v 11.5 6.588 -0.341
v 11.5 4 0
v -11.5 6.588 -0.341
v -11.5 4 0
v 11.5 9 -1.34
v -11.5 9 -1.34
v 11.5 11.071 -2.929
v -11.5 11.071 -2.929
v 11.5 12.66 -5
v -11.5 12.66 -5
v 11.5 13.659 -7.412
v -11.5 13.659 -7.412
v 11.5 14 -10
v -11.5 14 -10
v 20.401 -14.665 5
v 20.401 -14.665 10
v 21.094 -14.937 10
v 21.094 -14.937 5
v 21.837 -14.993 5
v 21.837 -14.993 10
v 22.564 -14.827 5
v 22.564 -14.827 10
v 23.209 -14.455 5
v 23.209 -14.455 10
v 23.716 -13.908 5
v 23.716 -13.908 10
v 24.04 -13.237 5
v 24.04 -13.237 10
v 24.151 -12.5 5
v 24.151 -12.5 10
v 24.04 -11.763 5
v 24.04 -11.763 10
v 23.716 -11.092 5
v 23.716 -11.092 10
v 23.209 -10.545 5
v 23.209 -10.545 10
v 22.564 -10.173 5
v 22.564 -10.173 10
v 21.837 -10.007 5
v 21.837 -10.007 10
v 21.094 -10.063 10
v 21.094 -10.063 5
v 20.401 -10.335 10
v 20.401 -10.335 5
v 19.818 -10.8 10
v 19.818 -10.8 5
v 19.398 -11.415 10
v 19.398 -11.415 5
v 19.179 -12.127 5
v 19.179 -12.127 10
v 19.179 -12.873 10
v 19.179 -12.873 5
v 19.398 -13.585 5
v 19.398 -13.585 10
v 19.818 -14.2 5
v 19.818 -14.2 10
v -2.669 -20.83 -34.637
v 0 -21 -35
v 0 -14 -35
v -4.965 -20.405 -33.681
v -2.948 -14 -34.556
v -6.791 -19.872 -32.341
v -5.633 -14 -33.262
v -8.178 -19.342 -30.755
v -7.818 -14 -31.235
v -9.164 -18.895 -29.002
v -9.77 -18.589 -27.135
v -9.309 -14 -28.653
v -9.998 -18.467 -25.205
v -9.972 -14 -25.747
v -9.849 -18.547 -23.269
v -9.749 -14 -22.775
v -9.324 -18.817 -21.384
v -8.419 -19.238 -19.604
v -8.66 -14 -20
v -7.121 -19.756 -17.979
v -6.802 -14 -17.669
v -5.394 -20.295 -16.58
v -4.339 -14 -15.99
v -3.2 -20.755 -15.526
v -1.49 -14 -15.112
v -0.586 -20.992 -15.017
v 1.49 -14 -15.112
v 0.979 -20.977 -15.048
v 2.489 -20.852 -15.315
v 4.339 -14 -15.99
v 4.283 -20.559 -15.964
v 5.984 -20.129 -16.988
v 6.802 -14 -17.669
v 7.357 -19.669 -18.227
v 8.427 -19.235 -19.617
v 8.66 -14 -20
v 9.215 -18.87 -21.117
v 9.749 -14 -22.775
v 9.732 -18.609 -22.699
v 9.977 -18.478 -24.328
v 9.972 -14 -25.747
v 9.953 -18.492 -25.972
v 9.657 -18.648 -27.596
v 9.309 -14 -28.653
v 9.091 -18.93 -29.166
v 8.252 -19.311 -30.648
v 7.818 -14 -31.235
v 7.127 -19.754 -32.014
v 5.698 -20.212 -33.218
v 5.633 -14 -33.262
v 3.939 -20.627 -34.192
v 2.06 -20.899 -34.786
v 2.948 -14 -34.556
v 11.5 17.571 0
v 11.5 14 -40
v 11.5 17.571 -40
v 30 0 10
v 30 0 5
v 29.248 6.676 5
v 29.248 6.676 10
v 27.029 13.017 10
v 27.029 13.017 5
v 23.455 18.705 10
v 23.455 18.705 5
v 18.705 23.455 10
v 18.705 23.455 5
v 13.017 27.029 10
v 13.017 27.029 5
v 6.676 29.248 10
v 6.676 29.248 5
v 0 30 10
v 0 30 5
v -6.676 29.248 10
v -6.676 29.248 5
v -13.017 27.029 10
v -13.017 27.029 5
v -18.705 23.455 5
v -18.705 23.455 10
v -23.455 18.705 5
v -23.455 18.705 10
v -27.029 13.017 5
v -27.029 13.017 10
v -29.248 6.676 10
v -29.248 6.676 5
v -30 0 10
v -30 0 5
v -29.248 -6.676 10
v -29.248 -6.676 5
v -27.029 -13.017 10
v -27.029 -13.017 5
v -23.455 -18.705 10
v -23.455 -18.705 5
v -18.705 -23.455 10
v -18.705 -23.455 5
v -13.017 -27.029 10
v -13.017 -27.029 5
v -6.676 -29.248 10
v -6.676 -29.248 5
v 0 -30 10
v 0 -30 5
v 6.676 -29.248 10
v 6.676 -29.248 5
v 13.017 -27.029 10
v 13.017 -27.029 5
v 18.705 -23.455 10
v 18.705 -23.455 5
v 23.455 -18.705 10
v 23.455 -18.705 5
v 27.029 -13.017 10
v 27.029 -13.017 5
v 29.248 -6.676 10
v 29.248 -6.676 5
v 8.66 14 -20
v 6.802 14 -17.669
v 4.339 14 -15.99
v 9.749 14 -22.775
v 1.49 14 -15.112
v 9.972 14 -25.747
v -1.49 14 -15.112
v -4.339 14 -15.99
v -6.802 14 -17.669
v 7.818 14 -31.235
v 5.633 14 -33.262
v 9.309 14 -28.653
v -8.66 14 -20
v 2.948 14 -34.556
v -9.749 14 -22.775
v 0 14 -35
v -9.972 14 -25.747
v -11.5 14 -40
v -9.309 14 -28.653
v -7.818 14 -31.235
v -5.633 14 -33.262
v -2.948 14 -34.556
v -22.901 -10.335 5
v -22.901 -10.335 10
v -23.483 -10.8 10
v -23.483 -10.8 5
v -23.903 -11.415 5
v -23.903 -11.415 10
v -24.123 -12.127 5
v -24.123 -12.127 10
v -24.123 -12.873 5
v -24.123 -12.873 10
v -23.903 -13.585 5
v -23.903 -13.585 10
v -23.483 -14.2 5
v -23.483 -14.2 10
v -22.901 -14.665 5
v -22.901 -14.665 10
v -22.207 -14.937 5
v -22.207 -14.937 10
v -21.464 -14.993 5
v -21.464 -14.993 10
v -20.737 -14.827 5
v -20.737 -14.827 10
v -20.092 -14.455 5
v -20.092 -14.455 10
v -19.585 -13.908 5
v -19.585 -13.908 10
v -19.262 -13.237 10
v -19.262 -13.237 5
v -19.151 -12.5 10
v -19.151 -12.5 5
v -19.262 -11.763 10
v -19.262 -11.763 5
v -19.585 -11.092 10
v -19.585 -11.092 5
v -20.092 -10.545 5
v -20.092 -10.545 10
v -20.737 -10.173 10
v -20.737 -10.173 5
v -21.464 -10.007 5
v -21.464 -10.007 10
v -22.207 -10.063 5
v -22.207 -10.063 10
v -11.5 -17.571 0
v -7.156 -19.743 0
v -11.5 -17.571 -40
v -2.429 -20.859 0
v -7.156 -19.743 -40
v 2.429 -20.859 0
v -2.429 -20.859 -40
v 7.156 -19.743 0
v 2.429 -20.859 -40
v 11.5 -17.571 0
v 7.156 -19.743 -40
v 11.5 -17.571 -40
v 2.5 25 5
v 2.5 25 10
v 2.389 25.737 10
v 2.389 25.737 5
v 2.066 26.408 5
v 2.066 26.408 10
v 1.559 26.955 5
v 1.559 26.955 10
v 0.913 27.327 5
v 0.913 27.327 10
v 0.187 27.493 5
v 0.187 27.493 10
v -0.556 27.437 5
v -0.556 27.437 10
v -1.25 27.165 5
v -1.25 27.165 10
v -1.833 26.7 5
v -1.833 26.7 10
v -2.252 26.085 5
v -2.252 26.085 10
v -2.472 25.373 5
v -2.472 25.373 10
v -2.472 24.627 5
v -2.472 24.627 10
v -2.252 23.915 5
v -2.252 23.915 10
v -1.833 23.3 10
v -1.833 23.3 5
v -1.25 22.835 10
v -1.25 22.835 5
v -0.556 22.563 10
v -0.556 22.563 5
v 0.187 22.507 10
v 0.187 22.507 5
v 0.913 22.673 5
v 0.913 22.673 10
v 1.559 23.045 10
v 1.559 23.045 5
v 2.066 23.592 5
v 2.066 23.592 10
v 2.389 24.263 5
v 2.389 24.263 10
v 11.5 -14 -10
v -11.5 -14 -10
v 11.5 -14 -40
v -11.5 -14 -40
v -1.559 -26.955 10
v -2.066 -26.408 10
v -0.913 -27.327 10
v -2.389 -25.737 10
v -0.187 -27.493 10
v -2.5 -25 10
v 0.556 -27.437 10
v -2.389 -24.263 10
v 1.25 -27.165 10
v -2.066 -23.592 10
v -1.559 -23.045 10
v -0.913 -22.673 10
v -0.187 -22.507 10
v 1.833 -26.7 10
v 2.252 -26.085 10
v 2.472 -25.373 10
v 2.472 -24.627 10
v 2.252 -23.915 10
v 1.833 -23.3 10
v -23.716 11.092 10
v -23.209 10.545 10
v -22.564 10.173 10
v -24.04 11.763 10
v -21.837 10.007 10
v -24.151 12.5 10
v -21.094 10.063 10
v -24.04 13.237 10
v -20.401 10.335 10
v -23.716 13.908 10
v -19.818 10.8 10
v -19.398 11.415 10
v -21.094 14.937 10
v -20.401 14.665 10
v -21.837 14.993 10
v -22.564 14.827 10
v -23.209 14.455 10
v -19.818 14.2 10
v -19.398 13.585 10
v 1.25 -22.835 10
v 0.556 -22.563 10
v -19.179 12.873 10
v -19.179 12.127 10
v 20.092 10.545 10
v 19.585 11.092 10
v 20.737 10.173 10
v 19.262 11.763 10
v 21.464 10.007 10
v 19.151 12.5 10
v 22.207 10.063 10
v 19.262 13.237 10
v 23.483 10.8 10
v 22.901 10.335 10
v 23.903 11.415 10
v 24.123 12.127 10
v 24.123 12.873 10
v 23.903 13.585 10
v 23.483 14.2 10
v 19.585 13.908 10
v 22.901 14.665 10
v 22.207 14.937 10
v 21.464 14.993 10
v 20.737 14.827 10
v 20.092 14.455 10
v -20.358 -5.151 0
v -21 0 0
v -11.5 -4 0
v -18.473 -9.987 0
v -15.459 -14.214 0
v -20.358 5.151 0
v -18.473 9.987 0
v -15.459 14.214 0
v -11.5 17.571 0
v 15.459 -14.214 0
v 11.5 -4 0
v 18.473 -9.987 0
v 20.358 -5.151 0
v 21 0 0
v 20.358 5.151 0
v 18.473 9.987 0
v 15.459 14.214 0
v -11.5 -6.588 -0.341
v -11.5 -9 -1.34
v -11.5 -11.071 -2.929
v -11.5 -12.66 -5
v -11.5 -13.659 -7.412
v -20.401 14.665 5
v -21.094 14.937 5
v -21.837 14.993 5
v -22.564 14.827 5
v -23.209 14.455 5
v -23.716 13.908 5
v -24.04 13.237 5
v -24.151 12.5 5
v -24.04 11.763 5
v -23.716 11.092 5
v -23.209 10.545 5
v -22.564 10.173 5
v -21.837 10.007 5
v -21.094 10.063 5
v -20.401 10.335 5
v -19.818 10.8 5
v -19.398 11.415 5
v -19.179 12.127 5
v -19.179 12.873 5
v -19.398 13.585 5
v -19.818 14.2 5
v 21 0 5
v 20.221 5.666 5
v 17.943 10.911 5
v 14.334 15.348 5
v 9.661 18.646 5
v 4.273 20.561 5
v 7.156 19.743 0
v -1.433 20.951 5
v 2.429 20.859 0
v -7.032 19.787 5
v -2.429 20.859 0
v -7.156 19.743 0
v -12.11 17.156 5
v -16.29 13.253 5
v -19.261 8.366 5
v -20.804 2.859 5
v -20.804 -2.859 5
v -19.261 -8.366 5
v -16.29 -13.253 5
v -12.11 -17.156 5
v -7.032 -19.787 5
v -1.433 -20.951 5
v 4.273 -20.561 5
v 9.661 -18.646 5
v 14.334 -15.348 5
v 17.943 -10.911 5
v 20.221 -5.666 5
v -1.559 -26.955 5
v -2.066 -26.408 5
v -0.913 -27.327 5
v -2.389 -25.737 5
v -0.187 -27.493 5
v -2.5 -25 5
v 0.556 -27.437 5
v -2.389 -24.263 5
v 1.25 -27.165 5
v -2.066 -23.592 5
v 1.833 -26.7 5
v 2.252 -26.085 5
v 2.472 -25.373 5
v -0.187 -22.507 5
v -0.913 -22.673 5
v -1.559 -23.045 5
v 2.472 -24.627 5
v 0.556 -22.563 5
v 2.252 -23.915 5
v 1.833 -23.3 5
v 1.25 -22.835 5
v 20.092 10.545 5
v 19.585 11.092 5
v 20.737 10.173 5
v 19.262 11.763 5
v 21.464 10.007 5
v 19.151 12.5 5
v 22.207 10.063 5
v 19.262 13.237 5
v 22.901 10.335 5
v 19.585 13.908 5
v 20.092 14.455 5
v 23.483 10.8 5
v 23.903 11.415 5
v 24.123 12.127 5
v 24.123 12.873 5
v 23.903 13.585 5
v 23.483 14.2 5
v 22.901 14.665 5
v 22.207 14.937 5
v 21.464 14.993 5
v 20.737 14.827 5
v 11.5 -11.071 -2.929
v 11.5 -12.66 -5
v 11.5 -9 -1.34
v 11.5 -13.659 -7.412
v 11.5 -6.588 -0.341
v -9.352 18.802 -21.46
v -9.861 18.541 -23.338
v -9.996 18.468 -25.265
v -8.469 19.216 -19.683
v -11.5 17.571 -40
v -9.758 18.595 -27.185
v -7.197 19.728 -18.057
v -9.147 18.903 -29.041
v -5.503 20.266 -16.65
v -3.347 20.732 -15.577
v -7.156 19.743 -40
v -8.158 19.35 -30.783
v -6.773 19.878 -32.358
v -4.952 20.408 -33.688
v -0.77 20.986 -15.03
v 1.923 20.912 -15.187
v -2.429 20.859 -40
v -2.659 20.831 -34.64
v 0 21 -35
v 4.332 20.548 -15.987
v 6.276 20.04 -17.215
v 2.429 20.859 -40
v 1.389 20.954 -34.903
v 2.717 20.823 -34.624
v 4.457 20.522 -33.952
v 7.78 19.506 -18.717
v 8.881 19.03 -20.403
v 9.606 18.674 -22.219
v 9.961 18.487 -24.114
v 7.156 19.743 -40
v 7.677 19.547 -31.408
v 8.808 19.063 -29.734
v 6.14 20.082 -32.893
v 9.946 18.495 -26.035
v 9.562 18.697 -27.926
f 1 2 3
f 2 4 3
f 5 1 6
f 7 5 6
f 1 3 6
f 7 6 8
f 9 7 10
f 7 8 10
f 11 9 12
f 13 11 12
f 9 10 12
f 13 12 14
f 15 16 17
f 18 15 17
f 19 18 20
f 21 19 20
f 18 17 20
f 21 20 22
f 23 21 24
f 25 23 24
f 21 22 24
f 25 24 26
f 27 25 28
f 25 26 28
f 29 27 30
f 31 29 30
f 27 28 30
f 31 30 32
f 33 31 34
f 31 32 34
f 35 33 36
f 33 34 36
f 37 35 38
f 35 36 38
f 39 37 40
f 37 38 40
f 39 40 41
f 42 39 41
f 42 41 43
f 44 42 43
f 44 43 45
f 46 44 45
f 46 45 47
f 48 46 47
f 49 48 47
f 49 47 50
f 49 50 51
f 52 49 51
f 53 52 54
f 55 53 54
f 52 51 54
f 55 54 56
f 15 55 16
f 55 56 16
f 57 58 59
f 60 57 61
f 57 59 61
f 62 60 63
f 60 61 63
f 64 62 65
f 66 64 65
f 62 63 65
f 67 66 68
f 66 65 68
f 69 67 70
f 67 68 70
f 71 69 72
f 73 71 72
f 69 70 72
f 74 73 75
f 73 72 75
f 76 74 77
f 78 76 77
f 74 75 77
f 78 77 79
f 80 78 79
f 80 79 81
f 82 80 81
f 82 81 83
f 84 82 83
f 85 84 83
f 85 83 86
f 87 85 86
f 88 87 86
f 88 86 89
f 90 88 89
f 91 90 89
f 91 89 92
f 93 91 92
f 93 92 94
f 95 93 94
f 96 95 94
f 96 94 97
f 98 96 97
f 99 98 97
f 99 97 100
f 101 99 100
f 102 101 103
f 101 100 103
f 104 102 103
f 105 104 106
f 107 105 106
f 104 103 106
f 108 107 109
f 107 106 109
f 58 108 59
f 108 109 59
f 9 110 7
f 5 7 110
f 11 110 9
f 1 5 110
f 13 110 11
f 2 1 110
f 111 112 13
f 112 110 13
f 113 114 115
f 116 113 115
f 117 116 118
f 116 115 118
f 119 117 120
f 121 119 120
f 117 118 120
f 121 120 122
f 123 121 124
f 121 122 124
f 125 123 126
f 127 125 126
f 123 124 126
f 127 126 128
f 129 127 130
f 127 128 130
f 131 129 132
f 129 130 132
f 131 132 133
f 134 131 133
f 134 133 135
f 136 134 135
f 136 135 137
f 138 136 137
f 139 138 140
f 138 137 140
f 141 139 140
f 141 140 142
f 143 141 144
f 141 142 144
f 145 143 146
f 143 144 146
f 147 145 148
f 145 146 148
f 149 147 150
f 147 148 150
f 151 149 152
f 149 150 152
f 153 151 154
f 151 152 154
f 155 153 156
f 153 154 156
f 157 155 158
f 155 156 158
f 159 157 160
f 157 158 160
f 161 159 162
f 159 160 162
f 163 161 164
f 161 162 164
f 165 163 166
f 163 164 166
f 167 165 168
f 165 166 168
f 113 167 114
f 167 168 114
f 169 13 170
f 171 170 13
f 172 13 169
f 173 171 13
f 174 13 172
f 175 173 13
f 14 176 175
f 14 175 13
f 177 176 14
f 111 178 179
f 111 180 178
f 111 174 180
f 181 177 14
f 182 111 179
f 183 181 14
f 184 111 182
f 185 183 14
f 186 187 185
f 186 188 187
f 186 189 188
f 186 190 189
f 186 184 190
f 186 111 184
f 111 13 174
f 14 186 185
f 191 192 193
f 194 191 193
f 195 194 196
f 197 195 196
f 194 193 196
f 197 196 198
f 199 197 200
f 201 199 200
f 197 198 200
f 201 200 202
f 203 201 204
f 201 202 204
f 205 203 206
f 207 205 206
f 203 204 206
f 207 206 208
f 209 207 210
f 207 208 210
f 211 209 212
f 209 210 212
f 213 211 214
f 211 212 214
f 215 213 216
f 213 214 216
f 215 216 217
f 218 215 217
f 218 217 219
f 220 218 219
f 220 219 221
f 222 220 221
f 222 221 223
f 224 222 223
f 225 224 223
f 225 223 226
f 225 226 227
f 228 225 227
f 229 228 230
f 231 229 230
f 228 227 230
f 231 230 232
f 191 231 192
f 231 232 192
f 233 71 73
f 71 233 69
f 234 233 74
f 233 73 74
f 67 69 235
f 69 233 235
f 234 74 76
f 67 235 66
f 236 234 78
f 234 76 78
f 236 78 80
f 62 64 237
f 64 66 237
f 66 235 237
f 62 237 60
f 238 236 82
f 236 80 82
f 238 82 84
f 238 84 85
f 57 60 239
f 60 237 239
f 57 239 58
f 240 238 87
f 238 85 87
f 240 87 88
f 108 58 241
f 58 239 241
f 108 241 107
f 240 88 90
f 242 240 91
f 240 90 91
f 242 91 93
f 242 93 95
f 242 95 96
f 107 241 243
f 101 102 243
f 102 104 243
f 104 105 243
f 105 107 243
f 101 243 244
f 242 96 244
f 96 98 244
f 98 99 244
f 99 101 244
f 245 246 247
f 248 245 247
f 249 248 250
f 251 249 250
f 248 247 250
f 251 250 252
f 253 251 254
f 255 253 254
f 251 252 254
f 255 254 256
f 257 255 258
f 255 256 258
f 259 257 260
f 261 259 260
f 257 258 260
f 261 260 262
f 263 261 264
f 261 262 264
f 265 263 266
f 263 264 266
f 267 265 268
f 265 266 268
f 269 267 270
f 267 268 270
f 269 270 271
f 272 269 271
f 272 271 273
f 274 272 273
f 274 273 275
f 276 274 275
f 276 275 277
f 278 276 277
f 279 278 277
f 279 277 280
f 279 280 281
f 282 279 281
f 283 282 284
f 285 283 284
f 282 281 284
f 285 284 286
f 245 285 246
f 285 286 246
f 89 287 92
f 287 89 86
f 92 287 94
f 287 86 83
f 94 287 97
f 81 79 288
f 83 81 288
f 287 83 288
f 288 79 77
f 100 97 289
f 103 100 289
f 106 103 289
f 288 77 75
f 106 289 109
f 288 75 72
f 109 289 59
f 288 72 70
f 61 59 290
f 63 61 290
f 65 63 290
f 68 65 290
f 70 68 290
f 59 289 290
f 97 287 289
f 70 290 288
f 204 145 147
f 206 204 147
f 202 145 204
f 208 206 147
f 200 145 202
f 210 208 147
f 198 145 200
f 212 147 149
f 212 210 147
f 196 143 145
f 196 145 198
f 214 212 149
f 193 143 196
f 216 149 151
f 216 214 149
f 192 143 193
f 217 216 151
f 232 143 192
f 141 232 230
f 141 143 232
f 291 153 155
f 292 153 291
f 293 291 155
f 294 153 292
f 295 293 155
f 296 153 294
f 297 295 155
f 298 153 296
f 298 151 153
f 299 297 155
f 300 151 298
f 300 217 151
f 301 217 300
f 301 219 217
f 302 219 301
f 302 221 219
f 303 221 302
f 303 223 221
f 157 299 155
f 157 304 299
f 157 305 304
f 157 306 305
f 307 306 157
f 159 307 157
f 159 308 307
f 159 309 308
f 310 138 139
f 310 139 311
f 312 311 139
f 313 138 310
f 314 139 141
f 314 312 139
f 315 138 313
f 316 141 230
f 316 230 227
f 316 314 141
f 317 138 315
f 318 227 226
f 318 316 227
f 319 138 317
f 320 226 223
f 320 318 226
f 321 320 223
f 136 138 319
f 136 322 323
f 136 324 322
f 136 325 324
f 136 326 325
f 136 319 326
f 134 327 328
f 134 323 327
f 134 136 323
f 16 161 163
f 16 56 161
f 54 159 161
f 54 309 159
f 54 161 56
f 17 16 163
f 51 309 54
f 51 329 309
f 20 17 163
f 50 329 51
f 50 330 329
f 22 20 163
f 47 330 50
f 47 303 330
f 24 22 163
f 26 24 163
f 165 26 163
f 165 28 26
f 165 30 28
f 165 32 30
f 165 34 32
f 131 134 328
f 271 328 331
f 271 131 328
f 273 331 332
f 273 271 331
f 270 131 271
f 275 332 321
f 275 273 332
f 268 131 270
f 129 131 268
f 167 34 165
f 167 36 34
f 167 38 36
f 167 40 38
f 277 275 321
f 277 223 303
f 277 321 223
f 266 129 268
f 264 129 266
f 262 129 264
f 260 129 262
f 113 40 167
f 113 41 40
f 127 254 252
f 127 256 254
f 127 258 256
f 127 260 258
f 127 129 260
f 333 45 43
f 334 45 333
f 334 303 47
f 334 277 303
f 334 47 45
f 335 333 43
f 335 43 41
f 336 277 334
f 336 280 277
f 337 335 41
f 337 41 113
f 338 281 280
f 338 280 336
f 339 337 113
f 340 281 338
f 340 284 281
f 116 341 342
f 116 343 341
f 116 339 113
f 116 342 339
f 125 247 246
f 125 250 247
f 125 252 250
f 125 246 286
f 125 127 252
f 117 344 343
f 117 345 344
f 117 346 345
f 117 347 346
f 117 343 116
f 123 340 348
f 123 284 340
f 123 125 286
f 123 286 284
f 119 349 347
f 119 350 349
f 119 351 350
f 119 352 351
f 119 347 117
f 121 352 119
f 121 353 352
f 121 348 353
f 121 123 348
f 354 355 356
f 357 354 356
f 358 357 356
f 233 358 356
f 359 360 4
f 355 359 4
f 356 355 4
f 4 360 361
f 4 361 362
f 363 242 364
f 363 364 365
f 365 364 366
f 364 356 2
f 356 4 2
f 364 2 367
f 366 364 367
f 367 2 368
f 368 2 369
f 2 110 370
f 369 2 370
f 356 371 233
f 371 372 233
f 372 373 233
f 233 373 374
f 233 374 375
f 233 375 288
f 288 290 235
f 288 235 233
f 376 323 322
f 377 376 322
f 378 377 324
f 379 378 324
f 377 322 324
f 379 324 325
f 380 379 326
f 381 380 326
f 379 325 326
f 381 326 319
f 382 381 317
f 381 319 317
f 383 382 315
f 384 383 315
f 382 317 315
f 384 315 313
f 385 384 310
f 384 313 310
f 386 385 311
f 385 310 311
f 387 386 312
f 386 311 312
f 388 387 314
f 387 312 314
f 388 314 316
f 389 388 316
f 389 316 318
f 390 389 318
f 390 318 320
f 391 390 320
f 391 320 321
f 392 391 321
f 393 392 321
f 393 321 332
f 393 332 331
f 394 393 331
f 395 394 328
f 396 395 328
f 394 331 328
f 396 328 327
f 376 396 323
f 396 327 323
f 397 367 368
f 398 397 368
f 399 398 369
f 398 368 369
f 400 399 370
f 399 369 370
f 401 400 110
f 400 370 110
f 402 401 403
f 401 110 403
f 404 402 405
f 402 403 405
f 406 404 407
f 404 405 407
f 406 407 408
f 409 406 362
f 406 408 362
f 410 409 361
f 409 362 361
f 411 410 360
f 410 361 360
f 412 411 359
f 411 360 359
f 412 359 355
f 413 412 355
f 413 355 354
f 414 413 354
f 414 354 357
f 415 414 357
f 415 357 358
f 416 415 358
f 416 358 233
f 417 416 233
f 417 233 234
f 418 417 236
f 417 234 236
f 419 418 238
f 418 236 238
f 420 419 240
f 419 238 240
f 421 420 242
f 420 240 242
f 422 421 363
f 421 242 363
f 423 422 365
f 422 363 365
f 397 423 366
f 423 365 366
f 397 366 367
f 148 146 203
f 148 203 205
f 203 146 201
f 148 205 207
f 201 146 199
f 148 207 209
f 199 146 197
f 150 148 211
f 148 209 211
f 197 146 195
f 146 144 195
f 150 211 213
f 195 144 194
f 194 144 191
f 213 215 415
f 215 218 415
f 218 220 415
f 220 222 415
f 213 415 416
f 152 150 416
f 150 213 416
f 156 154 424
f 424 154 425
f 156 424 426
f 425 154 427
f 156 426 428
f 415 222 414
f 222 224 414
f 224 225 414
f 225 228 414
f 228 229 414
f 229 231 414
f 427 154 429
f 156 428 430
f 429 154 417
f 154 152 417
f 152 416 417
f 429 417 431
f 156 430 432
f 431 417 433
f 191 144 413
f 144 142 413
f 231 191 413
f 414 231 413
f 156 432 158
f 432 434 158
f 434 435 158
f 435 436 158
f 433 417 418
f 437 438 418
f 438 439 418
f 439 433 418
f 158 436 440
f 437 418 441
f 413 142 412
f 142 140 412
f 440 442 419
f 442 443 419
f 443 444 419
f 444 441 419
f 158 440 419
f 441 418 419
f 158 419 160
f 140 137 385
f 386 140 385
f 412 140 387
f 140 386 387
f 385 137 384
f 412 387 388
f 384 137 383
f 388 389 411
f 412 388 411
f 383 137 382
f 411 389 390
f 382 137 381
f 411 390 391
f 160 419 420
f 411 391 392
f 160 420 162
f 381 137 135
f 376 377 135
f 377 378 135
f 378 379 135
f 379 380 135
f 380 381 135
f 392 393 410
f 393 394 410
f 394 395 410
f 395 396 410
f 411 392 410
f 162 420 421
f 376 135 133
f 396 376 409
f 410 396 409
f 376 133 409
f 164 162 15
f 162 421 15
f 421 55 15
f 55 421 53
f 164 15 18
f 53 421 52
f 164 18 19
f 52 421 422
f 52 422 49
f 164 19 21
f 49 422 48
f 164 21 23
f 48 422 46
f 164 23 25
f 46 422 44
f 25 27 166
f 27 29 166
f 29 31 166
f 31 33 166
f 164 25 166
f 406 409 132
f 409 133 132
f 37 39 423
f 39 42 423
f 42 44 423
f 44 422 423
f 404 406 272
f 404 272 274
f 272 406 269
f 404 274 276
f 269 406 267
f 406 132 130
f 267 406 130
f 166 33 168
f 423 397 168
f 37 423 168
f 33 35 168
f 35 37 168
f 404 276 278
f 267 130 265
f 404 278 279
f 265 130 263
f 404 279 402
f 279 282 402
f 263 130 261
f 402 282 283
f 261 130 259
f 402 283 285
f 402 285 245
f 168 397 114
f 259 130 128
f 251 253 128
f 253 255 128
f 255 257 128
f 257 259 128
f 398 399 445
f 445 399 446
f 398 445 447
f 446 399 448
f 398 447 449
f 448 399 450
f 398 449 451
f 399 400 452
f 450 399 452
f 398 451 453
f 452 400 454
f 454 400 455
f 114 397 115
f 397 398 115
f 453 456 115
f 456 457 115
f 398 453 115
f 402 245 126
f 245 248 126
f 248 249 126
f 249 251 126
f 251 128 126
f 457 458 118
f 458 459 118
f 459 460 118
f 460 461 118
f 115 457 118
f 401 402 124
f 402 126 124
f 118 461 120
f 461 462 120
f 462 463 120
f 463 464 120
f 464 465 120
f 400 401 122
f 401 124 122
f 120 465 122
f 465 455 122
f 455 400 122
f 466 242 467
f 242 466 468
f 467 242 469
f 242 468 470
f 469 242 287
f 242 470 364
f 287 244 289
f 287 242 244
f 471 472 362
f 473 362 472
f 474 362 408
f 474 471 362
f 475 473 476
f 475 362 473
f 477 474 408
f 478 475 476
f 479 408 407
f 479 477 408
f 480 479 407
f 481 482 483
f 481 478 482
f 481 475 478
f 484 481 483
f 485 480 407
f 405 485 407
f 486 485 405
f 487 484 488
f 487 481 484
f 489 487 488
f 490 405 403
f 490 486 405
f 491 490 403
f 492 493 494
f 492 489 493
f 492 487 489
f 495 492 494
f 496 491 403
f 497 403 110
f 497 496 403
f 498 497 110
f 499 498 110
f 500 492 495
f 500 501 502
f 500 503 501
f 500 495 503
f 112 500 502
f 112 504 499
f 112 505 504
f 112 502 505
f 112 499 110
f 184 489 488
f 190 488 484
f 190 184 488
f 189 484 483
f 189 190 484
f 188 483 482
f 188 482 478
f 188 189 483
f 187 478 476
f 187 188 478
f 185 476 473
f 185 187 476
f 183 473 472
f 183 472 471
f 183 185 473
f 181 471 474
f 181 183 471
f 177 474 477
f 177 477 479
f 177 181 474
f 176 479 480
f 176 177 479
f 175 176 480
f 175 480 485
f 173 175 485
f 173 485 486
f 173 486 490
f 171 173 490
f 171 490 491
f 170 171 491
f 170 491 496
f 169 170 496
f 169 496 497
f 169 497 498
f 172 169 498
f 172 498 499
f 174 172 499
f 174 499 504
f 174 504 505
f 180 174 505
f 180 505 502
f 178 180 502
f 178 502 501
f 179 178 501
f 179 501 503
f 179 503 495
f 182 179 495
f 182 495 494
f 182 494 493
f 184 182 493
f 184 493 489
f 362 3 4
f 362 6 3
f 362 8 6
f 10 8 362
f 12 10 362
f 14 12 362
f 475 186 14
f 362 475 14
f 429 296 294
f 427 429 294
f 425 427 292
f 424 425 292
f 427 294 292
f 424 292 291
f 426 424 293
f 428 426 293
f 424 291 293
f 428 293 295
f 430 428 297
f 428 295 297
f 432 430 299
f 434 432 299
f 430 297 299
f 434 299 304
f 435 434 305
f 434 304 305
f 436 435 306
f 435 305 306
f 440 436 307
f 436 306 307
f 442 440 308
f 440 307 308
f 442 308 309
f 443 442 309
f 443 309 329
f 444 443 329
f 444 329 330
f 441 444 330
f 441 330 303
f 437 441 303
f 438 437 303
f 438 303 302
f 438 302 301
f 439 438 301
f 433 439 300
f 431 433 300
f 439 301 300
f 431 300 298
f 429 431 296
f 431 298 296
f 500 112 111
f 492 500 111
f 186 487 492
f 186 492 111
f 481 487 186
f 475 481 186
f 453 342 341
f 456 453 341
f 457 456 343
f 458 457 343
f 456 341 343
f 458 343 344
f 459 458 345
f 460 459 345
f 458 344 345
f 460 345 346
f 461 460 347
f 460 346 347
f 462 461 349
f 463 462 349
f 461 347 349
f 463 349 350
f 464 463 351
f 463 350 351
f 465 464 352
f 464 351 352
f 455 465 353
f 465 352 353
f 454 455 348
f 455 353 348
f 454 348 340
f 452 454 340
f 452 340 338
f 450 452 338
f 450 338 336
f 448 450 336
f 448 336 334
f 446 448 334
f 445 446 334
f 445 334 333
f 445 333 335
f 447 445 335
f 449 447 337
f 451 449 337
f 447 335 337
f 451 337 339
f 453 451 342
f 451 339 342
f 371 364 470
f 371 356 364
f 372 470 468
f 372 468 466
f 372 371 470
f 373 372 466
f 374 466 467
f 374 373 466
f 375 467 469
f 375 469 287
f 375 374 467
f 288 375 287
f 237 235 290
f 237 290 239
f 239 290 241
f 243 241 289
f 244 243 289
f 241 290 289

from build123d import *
from build123d.topology import SkipClean

# Parameters (mm, degrees)
SZKIC1_R                               = 21
DODANIE_WYCI_GNI_CIE1_DEPTH            = 5
DODANIE_WYCI_GNI_CIE2_START            = 40
DODANIE_WYCI_GNI_CIE2_DEPTH            = 40
WYTNIJ_WYCI_GNI_CIE1_REACH             = 59.149
SZKIC4_R                               = 10
WYTNIJ_WYCI_GNI_CIE1_DIRECTION_2_DEPTH = 58.148928249
ZAOKR_GLENIE1_R                        = 10
SZKIC6_R                               = 30
DODANIE_WYCI_GNI_CIE3_DEPTH            = 5
SZKIC7_R                               = 2.5
WYTNIJ_WYCI_GNI_CIE2_DEPTH             = 5
SZYK_KO_OWY1_COUNT                     = 6


with BuildPart() as part:
    # Szkic1 → Dodanie-wyciągnięcie1 (new body)
    with BuildSketch(Plane.XY):
        Circle(SZKIC1_R)
    extrude(amount=DODANIE_WYCI_GNI_CIE1_DEPTH)

    # Szkic2 → Dodanie-wyciągnięcie2 (add)
    with SkipClean():  # the faces are left unmerged after this step: merging them gives an invalid solid
        with BuildSketch(Plane(origin=(0, 0, 0), x_dir=(-1, 0, 0), z_dir=(0, 0, -1)).offset(DODANIE_WYCI_GNI_CIE2_START)):
            with BuildLine():
                Line((-11.5, 17.571283391), (-11.5, 14))
                Line((-11.5, 14), (11.5, 14))
                Line((11.5, 14), (11.5, 17.571283391))
                ThreePointArc((11.5, 17.571283391), (0, 21), (-11.5, 17.571283391))
            make_face()
            with BuildLine():
                Line((11.5, -14), (11.5, -17.571283391))
                ThreePointArc((11.5, -17.571283391), (0, -21), (-11.5, -17.571283391))
                Line((-11.5, -17.571283391), (-11.5, -14))
                Line((-11.5, -14), (11.5, -14))
            make_face()
        extrude(amount=-DODANIE_WYCI_GNI_CIE2_DEPTH)

    # Szkic4 → Wytnij-wyciągnięcie1 (cut, up to next)
    with BuildSketch(Plane(origin=(0, -14, 0), x_dir=(1, 0, 0), z_dir=(0, 1, 0)), mode=Mode.PRIVATE) as wytnij_wyci_gni_cie1_sk1:
        with Locations(Location((0, 25, 0), (0, 0, 90))):
            Circle(SZKIC4_R)
    wytnij_wyci_gni_cie1_tool1 = extrude(wytnij_wyci_gni_cie1_sk1.sketch, amount=-WYTNIJ_WYCI_GNI_CIE1_REACH, mode=Mode.PRIVATE) & part.part
    add(wytnij_wyci_gni_cie1_tool1.solids().sort_by_distance((0, -14, -25))[0], mode=Mode.SUBTRACT)

    # Szkic4 → Wytnij-wyciągnięcie1 direction 2 (cut)
    with SkipClean():  # the faces are left unmerged after this step: merging them gives an invalid solid
        with BuildSketch(Plane(origin=(0, -14, 0), x_dir=(1, 0, 0), z_dir=(0, 1, 0))):
            with Locations(Location((0, 25, 0), (0, 0, 90))):
                Circle(SZKIC4_R)
        extrude(amount=WYTNIJ_WYCI_GNI_CIE1_DIRECTION_2_DEPTH, mode=Mode.SUBTRACT)

    # Zaokrąglenie1
    zaokr_glenie1_edges = [part.edges().sort_by_distance(p)[0] for p in [
        (0, -14, 0),
        (0, 14, 0),
    ]]
    fillet(zaokr_glenie1_edges, radius=ZAOKR_GLENIE1_R)

    # Szkic6 → Dodanie-wyciągnięcie3 (add)
    with SkipClean():  # the faces are left unmerged after this step: merging them gives an invalid solid
        with BuildSketch(Plane.XY.offset(5)):
            Circle(SZKIC6_R)
        extrude(amount=DODANIE_WYCI_GNI_CIE3_DEPTH)

    # Szkic7 → Wytnij-wyciągnięcie2 (cut)
    with SkipClean():  # the faces are left unmerged after this step: merging them gives an invalid solid
        with BuildSketch(Plane.XY.offset(10)):
            with Locations((0, 25)):
                Circle(SZKIC7_R)
        wytnij_wyci_gni_cie2 = extrude(amount=-WYTNIJ_WYCI_GNI_CIE2_DEPTH, mode=Mode.SUBTRACT)

    # Szyk kołowy1: Wytnij-wyciągnięcie2 ×6 about axis
    with SkipClean():  # the faces are left unmerged after this step: merging them gives an invalid solid
        szyk_ko_owy1_axis = Axis((0, 0, 0), (0, 0, 1))
        for i in range(1, SZYK_KO_OWY1_COUNT):
            add(wytnij_wyci_gni_cie2.rotate(szyk_ko_owy1_axis, i * 360 / SZYK_KO_OWY1_COUNT), mode=Mode.SUBTRACT)


solid = part.part
